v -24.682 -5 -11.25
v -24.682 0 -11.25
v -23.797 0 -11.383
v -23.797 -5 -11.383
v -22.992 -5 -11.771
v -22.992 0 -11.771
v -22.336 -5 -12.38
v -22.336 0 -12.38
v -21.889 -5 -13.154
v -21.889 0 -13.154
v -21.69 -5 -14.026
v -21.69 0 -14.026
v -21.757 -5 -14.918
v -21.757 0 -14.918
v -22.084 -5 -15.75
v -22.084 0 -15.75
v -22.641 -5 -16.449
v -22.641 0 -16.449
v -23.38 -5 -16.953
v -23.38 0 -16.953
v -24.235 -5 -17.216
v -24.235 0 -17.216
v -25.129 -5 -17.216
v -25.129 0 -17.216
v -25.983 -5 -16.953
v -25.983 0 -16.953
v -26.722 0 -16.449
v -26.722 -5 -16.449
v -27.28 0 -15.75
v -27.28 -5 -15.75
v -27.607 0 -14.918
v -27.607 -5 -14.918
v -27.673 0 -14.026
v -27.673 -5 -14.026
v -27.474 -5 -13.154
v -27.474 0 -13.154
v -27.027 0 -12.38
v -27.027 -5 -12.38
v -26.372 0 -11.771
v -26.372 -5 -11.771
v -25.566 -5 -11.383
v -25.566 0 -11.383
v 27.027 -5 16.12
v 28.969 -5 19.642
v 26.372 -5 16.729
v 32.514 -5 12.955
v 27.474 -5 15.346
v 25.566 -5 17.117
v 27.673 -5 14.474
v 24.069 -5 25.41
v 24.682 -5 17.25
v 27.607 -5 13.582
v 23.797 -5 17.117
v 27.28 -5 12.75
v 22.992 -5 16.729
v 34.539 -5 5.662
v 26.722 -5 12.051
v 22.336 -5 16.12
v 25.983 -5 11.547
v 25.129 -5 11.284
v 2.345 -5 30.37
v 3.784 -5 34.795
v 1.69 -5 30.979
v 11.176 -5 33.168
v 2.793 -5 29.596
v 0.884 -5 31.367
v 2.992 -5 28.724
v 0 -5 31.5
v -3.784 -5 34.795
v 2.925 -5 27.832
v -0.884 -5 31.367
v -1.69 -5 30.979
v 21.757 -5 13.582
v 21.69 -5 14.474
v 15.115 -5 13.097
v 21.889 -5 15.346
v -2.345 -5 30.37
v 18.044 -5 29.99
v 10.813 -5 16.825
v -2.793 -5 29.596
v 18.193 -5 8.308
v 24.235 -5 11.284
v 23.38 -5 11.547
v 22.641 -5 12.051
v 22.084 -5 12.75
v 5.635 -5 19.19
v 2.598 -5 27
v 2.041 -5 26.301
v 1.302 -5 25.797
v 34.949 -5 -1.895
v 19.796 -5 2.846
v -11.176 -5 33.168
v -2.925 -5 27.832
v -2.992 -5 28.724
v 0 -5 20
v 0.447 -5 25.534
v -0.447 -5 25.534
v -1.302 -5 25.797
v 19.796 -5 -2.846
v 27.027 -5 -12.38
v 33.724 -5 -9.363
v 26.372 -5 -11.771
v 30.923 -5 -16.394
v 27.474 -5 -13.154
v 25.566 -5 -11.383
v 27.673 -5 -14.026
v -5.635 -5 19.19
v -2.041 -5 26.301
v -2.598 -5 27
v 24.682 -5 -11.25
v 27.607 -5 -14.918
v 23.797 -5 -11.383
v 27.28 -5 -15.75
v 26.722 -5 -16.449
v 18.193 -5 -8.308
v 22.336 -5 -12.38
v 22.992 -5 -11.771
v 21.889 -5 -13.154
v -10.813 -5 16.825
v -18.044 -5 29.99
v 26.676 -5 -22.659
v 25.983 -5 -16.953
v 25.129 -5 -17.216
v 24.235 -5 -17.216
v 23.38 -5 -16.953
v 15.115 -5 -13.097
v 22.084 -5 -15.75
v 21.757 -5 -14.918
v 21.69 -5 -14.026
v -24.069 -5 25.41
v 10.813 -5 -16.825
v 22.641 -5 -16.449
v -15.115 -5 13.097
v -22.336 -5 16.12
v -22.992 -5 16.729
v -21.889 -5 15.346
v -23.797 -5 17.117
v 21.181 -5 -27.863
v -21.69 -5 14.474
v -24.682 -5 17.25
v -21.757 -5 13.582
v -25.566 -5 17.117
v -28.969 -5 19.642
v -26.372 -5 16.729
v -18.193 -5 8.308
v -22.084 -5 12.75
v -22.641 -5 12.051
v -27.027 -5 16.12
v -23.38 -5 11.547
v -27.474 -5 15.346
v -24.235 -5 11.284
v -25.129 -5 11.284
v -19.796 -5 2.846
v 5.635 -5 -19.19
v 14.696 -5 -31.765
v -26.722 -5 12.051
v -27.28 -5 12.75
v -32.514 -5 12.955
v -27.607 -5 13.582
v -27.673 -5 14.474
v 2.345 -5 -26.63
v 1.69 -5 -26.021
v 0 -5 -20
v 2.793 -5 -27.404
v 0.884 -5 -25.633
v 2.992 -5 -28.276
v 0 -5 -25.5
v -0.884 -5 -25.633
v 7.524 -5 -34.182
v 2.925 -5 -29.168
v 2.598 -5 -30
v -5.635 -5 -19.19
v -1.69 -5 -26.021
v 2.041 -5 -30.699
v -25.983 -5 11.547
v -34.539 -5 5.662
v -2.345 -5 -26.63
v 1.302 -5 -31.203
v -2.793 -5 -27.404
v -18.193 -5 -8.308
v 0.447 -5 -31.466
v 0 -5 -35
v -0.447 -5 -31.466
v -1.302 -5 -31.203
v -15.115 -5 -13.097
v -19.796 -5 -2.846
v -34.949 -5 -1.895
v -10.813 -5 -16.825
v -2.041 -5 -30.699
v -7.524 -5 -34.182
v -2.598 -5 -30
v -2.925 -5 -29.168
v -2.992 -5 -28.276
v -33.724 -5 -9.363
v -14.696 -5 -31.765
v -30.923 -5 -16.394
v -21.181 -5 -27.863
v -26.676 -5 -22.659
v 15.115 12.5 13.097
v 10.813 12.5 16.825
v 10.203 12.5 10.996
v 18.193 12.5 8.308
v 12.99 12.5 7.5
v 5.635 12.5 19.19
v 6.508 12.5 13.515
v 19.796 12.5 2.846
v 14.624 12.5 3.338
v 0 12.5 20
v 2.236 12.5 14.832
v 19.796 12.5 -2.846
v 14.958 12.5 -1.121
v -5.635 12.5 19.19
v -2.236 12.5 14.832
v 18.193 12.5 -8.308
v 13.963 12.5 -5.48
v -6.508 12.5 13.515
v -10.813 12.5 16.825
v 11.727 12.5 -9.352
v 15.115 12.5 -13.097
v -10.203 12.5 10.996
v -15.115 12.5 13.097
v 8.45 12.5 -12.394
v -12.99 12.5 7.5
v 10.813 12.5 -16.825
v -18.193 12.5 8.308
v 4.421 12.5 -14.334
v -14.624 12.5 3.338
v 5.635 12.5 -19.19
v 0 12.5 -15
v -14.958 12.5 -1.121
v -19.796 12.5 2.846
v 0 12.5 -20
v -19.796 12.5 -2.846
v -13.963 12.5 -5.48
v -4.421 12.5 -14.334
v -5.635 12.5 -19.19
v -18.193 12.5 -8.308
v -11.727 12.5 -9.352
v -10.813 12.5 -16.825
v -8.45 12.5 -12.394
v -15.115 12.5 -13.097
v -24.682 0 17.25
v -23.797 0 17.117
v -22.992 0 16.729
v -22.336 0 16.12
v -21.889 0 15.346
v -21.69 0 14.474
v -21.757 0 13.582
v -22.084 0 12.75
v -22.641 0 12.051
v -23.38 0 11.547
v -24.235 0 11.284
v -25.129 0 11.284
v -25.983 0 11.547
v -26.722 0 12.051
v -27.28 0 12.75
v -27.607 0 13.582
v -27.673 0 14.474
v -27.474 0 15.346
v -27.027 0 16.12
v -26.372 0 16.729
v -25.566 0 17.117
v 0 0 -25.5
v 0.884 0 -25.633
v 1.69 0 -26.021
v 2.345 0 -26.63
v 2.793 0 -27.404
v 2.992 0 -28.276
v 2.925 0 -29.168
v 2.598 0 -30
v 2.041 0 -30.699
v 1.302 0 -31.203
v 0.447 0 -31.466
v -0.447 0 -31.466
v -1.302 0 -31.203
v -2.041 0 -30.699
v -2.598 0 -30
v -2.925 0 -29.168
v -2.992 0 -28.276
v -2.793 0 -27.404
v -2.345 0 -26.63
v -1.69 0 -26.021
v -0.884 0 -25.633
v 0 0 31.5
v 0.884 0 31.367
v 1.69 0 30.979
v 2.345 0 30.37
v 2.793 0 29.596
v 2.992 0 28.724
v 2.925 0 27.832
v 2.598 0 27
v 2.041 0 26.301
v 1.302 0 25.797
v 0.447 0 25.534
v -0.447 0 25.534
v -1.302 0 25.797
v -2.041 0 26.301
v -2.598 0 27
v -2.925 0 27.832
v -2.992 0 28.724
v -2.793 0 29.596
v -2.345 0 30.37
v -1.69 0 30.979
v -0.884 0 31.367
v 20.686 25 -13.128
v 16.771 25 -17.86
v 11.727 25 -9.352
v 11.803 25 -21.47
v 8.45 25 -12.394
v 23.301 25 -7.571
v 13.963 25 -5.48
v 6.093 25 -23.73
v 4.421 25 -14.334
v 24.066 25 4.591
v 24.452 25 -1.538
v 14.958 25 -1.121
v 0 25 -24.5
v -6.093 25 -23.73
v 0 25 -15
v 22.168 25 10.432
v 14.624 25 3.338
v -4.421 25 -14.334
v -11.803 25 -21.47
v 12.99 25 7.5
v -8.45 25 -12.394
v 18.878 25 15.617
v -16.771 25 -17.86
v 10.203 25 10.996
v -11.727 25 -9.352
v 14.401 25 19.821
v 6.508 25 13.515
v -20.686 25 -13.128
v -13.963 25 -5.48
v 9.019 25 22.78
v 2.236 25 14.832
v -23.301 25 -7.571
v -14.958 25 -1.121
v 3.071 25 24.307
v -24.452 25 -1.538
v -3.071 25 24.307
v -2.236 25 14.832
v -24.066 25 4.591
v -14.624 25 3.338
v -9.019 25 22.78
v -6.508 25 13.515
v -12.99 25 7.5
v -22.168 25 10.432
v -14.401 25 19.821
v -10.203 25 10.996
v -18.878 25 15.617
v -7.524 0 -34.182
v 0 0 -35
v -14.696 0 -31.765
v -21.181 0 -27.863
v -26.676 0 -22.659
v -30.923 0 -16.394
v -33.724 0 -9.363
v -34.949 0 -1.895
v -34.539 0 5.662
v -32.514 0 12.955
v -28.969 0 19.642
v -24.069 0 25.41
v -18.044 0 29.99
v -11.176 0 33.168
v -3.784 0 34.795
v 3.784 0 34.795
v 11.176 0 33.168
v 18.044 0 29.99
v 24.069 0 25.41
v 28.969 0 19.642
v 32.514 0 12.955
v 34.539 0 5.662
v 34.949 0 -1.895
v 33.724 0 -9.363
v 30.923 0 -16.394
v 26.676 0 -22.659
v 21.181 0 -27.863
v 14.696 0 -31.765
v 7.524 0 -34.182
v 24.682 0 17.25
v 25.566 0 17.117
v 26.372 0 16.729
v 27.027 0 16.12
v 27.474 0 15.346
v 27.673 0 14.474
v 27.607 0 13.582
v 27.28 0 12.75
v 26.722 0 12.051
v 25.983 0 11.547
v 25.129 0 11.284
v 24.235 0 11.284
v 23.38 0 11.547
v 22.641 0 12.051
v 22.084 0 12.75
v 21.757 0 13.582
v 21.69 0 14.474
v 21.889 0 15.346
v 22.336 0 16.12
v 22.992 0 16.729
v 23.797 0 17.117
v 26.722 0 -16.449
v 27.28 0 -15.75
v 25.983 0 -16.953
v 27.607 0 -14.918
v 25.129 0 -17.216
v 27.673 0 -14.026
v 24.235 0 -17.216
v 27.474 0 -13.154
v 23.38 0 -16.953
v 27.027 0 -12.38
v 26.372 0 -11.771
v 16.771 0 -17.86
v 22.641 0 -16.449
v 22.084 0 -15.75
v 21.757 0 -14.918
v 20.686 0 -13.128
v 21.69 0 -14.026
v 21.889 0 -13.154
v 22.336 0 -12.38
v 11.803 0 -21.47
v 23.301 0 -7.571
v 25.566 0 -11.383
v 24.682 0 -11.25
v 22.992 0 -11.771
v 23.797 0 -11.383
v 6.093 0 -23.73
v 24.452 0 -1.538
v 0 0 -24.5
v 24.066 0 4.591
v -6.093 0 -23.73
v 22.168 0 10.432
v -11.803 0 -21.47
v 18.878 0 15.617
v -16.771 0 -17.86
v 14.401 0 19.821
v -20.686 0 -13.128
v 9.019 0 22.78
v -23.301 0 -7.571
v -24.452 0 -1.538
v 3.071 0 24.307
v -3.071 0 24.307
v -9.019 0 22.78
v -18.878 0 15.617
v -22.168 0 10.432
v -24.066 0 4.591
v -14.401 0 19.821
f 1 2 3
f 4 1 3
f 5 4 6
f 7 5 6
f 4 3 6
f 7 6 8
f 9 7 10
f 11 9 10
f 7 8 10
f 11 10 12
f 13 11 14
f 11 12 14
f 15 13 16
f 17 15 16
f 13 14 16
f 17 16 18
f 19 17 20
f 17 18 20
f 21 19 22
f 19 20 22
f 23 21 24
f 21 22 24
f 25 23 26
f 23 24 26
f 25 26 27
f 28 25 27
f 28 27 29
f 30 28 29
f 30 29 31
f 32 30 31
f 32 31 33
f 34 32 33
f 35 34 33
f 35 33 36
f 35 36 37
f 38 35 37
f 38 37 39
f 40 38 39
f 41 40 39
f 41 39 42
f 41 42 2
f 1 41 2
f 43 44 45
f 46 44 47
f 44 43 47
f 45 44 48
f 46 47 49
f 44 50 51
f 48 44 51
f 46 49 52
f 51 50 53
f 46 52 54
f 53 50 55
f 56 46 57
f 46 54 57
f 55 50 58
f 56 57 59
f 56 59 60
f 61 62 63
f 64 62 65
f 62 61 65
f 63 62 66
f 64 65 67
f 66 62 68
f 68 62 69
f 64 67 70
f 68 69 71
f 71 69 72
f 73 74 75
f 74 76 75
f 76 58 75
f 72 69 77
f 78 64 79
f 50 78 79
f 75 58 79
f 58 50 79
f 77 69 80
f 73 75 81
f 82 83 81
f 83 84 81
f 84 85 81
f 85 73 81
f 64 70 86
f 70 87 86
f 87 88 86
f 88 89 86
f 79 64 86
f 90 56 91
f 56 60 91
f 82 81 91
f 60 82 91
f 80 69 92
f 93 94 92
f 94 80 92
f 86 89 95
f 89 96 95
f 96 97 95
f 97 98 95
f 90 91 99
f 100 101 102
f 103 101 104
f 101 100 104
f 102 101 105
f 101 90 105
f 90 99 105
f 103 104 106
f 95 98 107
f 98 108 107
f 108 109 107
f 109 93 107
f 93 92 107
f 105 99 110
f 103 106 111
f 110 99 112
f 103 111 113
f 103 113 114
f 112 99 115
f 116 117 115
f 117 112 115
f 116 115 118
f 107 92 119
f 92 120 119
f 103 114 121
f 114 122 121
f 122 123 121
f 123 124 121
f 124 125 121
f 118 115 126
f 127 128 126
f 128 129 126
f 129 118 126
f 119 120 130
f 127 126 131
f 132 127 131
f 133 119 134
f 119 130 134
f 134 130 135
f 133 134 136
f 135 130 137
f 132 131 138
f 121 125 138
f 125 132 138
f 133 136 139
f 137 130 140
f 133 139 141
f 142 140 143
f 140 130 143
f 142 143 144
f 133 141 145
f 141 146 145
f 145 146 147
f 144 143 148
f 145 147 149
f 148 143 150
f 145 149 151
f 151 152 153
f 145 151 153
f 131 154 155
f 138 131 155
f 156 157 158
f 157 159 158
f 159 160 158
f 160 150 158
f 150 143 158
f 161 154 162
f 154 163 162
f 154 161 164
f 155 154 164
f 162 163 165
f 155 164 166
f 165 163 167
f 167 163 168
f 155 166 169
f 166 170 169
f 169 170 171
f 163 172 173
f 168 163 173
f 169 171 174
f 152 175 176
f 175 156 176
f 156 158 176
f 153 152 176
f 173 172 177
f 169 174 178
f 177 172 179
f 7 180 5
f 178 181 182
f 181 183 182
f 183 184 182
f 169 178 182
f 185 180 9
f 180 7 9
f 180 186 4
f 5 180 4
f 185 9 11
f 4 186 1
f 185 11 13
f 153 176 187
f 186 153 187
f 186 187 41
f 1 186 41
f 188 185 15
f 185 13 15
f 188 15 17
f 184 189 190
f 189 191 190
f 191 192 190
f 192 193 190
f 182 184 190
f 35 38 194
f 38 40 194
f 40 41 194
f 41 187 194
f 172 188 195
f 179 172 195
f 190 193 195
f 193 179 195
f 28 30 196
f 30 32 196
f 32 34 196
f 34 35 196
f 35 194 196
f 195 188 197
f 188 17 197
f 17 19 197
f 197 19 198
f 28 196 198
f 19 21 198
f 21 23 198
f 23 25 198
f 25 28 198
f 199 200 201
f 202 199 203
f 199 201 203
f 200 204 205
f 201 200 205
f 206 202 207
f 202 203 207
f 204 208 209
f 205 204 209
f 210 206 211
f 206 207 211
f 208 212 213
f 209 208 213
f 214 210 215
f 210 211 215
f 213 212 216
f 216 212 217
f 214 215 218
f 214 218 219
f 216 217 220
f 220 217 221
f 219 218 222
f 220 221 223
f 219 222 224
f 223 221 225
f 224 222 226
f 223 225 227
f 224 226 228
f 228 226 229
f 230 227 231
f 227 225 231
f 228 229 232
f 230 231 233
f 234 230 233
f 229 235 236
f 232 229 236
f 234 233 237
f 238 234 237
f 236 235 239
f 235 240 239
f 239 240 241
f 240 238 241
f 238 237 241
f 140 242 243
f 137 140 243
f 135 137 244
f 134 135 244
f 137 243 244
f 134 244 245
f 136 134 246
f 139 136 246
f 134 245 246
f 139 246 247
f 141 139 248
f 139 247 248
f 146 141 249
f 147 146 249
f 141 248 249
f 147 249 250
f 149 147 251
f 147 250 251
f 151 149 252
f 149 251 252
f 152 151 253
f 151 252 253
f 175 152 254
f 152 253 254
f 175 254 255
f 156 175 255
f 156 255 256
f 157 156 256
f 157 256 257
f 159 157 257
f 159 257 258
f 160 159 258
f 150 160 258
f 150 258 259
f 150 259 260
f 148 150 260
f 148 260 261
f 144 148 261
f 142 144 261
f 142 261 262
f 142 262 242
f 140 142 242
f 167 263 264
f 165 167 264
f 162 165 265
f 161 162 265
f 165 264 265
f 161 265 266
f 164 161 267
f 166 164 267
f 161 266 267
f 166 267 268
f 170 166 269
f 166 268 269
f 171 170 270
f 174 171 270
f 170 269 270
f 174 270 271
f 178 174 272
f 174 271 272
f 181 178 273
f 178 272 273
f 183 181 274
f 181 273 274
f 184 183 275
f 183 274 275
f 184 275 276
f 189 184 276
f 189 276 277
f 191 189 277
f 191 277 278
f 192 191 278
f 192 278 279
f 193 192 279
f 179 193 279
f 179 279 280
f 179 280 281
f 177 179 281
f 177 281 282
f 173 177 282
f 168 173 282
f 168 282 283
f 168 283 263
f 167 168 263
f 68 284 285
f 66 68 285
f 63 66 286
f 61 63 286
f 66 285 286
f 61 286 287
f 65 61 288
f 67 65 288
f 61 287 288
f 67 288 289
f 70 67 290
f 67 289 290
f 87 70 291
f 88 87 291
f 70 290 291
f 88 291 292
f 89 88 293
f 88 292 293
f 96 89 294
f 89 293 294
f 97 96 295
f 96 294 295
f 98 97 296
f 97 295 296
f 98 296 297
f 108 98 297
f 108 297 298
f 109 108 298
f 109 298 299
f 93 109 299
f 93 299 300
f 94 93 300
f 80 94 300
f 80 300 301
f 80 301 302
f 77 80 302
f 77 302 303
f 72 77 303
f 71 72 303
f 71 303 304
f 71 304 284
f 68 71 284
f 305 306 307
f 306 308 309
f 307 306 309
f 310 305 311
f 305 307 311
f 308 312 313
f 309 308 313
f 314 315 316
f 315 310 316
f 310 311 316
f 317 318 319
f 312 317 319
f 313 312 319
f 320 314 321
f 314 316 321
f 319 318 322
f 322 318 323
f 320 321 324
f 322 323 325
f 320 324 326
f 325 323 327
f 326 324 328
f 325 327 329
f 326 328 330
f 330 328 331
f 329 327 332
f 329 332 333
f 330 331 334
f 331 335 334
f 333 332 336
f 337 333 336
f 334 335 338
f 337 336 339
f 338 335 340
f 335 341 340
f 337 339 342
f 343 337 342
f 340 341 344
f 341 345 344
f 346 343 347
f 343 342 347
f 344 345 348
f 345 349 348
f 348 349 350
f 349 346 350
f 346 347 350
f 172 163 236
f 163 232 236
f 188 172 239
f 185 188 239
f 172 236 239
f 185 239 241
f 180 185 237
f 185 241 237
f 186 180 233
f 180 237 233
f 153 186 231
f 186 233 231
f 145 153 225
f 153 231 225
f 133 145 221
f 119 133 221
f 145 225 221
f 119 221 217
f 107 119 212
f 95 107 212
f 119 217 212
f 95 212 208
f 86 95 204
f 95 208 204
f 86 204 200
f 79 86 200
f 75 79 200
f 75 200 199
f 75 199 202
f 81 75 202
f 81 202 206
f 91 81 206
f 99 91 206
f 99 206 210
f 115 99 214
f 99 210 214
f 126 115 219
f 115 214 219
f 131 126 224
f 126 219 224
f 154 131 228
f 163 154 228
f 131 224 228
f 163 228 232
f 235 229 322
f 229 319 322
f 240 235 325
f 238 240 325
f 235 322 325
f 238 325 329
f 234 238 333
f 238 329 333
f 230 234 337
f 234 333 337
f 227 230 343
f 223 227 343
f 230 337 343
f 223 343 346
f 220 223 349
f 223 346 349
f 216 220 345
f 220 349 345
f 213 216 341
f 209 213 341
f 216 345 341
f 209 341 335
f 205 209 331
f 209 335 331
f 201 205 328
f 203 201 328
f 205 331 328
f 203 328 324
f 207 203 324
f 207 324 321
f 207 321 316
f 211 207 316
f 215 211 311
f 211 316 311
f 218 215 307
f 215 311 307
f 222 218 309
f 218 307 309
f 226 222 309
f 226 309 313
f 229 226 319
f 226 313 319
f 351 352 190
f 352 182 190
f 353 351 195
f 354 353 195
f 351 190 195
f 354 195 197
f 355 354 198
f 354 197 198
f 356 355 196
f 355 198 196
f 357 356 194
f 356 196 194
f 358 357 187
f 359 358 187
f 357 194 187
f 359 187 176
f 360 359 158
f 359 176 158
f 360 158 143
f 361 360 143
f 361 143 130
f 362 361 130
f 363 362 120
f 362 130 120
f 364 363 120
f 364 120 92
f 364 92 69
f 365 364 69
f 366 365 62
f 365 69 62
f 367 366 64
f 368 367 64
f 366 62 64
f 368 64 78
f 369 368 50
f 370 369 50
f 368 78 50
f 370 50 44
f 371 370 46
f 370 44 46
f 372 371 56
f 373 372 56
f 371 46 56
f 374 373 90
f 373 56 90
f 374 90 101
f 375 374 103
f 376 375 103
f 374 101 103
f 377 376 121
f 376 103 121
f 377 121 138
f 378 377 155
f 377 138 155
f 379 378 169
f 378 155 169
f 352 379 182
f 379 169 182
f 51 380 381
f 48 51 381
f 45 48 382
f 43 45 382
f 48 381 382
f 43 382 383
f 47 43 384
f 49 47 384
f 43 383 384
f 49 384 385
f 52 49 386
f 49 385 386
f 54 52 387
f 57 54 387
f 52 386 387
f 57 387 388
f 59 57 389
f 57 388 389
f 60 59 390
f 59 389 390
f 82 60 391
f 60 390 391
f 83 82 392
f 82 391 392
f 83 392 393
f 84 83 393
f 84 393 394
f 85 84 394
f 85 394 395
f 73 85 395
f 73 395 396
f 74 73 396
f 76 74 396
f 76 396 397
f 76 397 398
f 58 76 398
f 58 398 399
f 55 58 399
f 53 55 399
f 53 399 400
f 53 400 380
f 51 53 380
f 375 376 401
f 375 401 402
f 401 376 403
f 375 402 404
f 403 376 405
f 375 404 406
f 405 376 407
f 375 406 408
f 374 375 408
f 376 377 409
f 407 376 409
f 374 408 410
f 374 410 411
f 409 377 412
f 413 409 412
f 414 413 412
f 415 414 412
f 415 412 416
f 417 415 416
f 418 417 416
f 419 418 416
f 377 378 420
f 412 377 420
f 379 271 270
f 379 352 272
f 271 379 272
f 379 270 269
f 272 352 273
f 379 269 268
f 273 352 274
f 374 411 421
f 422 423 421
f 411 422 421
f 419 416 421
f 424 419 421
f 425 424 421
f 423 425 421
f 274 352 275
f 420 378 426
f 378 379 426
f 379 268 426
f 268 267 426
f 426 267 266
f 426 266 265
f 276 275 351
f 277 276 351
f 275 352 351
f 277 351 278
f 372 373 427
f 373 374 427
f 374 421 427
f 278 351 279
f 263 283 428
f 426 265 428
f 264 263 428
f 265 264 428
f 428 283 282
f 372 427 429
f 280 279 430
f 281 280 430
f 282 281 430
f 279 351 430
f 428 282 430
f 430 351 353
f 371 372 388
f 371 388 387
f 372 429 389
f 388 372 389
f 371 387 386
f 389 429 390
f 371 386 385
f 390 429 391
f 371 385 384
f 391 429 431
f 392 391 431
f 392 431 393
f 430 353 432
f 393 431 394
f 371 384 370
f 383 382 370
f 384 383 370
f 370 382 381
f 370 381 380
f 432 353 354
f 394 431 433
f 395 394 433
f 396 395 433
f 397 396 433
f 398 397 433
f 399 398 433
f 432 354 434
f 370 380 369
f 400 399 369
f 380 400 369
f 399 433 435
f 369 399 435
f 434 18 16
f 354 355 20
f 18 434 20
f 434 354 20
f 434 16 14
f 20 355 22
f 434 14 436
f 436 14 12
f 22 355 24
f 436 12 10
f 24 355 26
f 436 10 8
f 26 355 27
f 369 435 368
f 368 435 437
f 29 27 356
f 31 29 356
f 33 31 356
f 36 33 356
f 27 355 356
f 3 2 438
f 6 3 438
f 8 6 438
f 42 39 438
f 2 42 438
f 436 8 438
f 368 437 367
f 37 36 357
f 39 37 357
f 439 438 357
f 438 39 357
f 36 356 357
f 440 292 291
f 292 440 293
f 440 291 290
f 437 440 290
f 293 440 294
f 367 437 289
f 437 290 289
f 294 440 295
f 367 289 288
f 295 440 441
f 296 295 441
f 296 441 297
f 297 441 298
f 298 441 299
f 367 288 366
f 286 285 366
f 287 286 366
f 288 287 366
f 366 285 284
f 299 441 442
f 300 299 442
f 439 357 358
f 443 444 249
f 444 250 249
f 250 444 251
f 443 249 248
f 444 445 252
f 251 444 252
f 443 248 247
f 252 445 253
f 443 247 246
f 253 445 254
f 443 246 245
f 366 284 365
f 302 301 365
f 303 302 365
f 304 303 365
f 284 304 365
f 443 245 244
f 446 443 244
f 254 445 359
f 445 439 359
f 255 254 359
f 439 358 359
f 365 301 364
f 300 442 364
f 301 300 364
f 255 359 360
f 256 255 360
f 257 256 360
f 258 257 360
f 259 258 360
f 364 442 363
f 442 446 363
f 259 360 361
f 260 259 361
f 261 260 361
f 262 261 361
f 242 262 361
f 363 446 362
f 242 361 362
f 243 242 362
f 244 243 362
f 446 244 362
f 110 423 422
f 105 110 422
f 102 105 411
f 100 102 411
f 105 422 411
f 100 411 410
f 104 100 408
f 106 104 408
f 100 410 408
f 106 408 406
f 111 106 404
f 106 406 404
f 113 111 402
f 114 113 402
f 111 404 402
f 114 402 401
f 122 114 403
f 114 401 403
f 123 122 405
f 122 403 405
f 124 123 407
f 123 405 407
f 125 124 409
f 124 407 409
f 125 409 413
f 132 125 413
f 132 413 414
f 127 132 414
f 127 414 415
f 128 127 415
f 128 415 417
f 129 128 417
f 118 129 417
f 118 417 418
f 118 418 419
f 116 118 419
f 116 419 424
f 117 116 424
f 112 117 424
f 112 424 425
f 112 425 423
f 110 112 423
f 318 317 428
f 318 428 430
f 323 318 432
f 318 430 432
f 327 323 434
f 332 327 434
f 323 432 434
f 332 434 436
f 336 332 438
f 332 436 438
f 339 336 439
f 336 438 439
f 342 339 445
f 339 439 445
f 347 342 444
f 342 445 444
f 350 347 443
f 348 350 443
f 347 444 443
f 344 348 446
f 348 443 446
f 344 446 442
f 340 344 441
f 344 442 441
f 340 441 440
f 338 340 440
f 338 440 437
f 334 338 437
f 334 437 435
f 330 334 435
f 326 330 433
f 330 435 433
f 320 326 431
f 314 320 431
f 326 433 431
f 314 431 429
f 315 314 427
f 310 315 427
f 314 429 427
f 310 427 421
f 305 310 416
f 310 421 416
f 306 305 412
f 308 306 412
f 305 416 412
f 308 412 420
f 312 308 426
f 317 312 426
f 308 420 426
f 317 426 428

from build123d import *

# Parameters (mm, degrees)
SKETCH2_R          = 3
CUT_EXTRUDE3_DEPTH = 58.879184514


with BuildPart() as part:
    # Sketch1 → Revolve1 (revolve)
    with BuildSketch(Plane.XY, mode=Mode.PRIVATE) as revolve1_sk:
        Polygon((24.5, 0), (35, 0), (35, -5), (20, -5), (20, 12.5), (15, 12.5), (15, 25), (24.5, 25), align=None)
    revolve(revolve1_sk.sketch.rotate(Axis((0, 0, 0), (0, 1, 0)), 90), axis=Axis((0, 0, 0), (0, 1, 0)))

    # Sketch2 → Cut-Extrude3 (cut, through all)
    with BuildSketch(Plane(origin=(0, 25, 0), x_dir=(1, 0, 0), z_dir=(0, 1, 0))):
        with Locations(Location((0, 28.5, 0), (0, 0, 270))):
            Circle(SKETCH2_R)
        with Locations(Location((24.681724008, 14.25, 0), (0, 0, 270))):
            Circle(SKETCH2_R)
        with Locations(Location((24.681724008, -14.25, 0), (0, 0, 270))):
            Circle(SKETCH2_R)
        with Locations(Location((0, -28.5, 0), (0, 0, 270))):
            Circle(SKETCH2_R)
        with Locations(Location((-24.681724008, -14.25, 0), (0, 0, 270))):
            Circle(SKETCH2_R)
        with Locations(Location((-24.681724008, 14.25, 0), (0, 0, 270))):
            Circle(SKETCH2_R)
    extrude(amount=-CUT_EXTRUDE3_DEPTH, mode=Mode.SUBTRACT)


solid = part.part
